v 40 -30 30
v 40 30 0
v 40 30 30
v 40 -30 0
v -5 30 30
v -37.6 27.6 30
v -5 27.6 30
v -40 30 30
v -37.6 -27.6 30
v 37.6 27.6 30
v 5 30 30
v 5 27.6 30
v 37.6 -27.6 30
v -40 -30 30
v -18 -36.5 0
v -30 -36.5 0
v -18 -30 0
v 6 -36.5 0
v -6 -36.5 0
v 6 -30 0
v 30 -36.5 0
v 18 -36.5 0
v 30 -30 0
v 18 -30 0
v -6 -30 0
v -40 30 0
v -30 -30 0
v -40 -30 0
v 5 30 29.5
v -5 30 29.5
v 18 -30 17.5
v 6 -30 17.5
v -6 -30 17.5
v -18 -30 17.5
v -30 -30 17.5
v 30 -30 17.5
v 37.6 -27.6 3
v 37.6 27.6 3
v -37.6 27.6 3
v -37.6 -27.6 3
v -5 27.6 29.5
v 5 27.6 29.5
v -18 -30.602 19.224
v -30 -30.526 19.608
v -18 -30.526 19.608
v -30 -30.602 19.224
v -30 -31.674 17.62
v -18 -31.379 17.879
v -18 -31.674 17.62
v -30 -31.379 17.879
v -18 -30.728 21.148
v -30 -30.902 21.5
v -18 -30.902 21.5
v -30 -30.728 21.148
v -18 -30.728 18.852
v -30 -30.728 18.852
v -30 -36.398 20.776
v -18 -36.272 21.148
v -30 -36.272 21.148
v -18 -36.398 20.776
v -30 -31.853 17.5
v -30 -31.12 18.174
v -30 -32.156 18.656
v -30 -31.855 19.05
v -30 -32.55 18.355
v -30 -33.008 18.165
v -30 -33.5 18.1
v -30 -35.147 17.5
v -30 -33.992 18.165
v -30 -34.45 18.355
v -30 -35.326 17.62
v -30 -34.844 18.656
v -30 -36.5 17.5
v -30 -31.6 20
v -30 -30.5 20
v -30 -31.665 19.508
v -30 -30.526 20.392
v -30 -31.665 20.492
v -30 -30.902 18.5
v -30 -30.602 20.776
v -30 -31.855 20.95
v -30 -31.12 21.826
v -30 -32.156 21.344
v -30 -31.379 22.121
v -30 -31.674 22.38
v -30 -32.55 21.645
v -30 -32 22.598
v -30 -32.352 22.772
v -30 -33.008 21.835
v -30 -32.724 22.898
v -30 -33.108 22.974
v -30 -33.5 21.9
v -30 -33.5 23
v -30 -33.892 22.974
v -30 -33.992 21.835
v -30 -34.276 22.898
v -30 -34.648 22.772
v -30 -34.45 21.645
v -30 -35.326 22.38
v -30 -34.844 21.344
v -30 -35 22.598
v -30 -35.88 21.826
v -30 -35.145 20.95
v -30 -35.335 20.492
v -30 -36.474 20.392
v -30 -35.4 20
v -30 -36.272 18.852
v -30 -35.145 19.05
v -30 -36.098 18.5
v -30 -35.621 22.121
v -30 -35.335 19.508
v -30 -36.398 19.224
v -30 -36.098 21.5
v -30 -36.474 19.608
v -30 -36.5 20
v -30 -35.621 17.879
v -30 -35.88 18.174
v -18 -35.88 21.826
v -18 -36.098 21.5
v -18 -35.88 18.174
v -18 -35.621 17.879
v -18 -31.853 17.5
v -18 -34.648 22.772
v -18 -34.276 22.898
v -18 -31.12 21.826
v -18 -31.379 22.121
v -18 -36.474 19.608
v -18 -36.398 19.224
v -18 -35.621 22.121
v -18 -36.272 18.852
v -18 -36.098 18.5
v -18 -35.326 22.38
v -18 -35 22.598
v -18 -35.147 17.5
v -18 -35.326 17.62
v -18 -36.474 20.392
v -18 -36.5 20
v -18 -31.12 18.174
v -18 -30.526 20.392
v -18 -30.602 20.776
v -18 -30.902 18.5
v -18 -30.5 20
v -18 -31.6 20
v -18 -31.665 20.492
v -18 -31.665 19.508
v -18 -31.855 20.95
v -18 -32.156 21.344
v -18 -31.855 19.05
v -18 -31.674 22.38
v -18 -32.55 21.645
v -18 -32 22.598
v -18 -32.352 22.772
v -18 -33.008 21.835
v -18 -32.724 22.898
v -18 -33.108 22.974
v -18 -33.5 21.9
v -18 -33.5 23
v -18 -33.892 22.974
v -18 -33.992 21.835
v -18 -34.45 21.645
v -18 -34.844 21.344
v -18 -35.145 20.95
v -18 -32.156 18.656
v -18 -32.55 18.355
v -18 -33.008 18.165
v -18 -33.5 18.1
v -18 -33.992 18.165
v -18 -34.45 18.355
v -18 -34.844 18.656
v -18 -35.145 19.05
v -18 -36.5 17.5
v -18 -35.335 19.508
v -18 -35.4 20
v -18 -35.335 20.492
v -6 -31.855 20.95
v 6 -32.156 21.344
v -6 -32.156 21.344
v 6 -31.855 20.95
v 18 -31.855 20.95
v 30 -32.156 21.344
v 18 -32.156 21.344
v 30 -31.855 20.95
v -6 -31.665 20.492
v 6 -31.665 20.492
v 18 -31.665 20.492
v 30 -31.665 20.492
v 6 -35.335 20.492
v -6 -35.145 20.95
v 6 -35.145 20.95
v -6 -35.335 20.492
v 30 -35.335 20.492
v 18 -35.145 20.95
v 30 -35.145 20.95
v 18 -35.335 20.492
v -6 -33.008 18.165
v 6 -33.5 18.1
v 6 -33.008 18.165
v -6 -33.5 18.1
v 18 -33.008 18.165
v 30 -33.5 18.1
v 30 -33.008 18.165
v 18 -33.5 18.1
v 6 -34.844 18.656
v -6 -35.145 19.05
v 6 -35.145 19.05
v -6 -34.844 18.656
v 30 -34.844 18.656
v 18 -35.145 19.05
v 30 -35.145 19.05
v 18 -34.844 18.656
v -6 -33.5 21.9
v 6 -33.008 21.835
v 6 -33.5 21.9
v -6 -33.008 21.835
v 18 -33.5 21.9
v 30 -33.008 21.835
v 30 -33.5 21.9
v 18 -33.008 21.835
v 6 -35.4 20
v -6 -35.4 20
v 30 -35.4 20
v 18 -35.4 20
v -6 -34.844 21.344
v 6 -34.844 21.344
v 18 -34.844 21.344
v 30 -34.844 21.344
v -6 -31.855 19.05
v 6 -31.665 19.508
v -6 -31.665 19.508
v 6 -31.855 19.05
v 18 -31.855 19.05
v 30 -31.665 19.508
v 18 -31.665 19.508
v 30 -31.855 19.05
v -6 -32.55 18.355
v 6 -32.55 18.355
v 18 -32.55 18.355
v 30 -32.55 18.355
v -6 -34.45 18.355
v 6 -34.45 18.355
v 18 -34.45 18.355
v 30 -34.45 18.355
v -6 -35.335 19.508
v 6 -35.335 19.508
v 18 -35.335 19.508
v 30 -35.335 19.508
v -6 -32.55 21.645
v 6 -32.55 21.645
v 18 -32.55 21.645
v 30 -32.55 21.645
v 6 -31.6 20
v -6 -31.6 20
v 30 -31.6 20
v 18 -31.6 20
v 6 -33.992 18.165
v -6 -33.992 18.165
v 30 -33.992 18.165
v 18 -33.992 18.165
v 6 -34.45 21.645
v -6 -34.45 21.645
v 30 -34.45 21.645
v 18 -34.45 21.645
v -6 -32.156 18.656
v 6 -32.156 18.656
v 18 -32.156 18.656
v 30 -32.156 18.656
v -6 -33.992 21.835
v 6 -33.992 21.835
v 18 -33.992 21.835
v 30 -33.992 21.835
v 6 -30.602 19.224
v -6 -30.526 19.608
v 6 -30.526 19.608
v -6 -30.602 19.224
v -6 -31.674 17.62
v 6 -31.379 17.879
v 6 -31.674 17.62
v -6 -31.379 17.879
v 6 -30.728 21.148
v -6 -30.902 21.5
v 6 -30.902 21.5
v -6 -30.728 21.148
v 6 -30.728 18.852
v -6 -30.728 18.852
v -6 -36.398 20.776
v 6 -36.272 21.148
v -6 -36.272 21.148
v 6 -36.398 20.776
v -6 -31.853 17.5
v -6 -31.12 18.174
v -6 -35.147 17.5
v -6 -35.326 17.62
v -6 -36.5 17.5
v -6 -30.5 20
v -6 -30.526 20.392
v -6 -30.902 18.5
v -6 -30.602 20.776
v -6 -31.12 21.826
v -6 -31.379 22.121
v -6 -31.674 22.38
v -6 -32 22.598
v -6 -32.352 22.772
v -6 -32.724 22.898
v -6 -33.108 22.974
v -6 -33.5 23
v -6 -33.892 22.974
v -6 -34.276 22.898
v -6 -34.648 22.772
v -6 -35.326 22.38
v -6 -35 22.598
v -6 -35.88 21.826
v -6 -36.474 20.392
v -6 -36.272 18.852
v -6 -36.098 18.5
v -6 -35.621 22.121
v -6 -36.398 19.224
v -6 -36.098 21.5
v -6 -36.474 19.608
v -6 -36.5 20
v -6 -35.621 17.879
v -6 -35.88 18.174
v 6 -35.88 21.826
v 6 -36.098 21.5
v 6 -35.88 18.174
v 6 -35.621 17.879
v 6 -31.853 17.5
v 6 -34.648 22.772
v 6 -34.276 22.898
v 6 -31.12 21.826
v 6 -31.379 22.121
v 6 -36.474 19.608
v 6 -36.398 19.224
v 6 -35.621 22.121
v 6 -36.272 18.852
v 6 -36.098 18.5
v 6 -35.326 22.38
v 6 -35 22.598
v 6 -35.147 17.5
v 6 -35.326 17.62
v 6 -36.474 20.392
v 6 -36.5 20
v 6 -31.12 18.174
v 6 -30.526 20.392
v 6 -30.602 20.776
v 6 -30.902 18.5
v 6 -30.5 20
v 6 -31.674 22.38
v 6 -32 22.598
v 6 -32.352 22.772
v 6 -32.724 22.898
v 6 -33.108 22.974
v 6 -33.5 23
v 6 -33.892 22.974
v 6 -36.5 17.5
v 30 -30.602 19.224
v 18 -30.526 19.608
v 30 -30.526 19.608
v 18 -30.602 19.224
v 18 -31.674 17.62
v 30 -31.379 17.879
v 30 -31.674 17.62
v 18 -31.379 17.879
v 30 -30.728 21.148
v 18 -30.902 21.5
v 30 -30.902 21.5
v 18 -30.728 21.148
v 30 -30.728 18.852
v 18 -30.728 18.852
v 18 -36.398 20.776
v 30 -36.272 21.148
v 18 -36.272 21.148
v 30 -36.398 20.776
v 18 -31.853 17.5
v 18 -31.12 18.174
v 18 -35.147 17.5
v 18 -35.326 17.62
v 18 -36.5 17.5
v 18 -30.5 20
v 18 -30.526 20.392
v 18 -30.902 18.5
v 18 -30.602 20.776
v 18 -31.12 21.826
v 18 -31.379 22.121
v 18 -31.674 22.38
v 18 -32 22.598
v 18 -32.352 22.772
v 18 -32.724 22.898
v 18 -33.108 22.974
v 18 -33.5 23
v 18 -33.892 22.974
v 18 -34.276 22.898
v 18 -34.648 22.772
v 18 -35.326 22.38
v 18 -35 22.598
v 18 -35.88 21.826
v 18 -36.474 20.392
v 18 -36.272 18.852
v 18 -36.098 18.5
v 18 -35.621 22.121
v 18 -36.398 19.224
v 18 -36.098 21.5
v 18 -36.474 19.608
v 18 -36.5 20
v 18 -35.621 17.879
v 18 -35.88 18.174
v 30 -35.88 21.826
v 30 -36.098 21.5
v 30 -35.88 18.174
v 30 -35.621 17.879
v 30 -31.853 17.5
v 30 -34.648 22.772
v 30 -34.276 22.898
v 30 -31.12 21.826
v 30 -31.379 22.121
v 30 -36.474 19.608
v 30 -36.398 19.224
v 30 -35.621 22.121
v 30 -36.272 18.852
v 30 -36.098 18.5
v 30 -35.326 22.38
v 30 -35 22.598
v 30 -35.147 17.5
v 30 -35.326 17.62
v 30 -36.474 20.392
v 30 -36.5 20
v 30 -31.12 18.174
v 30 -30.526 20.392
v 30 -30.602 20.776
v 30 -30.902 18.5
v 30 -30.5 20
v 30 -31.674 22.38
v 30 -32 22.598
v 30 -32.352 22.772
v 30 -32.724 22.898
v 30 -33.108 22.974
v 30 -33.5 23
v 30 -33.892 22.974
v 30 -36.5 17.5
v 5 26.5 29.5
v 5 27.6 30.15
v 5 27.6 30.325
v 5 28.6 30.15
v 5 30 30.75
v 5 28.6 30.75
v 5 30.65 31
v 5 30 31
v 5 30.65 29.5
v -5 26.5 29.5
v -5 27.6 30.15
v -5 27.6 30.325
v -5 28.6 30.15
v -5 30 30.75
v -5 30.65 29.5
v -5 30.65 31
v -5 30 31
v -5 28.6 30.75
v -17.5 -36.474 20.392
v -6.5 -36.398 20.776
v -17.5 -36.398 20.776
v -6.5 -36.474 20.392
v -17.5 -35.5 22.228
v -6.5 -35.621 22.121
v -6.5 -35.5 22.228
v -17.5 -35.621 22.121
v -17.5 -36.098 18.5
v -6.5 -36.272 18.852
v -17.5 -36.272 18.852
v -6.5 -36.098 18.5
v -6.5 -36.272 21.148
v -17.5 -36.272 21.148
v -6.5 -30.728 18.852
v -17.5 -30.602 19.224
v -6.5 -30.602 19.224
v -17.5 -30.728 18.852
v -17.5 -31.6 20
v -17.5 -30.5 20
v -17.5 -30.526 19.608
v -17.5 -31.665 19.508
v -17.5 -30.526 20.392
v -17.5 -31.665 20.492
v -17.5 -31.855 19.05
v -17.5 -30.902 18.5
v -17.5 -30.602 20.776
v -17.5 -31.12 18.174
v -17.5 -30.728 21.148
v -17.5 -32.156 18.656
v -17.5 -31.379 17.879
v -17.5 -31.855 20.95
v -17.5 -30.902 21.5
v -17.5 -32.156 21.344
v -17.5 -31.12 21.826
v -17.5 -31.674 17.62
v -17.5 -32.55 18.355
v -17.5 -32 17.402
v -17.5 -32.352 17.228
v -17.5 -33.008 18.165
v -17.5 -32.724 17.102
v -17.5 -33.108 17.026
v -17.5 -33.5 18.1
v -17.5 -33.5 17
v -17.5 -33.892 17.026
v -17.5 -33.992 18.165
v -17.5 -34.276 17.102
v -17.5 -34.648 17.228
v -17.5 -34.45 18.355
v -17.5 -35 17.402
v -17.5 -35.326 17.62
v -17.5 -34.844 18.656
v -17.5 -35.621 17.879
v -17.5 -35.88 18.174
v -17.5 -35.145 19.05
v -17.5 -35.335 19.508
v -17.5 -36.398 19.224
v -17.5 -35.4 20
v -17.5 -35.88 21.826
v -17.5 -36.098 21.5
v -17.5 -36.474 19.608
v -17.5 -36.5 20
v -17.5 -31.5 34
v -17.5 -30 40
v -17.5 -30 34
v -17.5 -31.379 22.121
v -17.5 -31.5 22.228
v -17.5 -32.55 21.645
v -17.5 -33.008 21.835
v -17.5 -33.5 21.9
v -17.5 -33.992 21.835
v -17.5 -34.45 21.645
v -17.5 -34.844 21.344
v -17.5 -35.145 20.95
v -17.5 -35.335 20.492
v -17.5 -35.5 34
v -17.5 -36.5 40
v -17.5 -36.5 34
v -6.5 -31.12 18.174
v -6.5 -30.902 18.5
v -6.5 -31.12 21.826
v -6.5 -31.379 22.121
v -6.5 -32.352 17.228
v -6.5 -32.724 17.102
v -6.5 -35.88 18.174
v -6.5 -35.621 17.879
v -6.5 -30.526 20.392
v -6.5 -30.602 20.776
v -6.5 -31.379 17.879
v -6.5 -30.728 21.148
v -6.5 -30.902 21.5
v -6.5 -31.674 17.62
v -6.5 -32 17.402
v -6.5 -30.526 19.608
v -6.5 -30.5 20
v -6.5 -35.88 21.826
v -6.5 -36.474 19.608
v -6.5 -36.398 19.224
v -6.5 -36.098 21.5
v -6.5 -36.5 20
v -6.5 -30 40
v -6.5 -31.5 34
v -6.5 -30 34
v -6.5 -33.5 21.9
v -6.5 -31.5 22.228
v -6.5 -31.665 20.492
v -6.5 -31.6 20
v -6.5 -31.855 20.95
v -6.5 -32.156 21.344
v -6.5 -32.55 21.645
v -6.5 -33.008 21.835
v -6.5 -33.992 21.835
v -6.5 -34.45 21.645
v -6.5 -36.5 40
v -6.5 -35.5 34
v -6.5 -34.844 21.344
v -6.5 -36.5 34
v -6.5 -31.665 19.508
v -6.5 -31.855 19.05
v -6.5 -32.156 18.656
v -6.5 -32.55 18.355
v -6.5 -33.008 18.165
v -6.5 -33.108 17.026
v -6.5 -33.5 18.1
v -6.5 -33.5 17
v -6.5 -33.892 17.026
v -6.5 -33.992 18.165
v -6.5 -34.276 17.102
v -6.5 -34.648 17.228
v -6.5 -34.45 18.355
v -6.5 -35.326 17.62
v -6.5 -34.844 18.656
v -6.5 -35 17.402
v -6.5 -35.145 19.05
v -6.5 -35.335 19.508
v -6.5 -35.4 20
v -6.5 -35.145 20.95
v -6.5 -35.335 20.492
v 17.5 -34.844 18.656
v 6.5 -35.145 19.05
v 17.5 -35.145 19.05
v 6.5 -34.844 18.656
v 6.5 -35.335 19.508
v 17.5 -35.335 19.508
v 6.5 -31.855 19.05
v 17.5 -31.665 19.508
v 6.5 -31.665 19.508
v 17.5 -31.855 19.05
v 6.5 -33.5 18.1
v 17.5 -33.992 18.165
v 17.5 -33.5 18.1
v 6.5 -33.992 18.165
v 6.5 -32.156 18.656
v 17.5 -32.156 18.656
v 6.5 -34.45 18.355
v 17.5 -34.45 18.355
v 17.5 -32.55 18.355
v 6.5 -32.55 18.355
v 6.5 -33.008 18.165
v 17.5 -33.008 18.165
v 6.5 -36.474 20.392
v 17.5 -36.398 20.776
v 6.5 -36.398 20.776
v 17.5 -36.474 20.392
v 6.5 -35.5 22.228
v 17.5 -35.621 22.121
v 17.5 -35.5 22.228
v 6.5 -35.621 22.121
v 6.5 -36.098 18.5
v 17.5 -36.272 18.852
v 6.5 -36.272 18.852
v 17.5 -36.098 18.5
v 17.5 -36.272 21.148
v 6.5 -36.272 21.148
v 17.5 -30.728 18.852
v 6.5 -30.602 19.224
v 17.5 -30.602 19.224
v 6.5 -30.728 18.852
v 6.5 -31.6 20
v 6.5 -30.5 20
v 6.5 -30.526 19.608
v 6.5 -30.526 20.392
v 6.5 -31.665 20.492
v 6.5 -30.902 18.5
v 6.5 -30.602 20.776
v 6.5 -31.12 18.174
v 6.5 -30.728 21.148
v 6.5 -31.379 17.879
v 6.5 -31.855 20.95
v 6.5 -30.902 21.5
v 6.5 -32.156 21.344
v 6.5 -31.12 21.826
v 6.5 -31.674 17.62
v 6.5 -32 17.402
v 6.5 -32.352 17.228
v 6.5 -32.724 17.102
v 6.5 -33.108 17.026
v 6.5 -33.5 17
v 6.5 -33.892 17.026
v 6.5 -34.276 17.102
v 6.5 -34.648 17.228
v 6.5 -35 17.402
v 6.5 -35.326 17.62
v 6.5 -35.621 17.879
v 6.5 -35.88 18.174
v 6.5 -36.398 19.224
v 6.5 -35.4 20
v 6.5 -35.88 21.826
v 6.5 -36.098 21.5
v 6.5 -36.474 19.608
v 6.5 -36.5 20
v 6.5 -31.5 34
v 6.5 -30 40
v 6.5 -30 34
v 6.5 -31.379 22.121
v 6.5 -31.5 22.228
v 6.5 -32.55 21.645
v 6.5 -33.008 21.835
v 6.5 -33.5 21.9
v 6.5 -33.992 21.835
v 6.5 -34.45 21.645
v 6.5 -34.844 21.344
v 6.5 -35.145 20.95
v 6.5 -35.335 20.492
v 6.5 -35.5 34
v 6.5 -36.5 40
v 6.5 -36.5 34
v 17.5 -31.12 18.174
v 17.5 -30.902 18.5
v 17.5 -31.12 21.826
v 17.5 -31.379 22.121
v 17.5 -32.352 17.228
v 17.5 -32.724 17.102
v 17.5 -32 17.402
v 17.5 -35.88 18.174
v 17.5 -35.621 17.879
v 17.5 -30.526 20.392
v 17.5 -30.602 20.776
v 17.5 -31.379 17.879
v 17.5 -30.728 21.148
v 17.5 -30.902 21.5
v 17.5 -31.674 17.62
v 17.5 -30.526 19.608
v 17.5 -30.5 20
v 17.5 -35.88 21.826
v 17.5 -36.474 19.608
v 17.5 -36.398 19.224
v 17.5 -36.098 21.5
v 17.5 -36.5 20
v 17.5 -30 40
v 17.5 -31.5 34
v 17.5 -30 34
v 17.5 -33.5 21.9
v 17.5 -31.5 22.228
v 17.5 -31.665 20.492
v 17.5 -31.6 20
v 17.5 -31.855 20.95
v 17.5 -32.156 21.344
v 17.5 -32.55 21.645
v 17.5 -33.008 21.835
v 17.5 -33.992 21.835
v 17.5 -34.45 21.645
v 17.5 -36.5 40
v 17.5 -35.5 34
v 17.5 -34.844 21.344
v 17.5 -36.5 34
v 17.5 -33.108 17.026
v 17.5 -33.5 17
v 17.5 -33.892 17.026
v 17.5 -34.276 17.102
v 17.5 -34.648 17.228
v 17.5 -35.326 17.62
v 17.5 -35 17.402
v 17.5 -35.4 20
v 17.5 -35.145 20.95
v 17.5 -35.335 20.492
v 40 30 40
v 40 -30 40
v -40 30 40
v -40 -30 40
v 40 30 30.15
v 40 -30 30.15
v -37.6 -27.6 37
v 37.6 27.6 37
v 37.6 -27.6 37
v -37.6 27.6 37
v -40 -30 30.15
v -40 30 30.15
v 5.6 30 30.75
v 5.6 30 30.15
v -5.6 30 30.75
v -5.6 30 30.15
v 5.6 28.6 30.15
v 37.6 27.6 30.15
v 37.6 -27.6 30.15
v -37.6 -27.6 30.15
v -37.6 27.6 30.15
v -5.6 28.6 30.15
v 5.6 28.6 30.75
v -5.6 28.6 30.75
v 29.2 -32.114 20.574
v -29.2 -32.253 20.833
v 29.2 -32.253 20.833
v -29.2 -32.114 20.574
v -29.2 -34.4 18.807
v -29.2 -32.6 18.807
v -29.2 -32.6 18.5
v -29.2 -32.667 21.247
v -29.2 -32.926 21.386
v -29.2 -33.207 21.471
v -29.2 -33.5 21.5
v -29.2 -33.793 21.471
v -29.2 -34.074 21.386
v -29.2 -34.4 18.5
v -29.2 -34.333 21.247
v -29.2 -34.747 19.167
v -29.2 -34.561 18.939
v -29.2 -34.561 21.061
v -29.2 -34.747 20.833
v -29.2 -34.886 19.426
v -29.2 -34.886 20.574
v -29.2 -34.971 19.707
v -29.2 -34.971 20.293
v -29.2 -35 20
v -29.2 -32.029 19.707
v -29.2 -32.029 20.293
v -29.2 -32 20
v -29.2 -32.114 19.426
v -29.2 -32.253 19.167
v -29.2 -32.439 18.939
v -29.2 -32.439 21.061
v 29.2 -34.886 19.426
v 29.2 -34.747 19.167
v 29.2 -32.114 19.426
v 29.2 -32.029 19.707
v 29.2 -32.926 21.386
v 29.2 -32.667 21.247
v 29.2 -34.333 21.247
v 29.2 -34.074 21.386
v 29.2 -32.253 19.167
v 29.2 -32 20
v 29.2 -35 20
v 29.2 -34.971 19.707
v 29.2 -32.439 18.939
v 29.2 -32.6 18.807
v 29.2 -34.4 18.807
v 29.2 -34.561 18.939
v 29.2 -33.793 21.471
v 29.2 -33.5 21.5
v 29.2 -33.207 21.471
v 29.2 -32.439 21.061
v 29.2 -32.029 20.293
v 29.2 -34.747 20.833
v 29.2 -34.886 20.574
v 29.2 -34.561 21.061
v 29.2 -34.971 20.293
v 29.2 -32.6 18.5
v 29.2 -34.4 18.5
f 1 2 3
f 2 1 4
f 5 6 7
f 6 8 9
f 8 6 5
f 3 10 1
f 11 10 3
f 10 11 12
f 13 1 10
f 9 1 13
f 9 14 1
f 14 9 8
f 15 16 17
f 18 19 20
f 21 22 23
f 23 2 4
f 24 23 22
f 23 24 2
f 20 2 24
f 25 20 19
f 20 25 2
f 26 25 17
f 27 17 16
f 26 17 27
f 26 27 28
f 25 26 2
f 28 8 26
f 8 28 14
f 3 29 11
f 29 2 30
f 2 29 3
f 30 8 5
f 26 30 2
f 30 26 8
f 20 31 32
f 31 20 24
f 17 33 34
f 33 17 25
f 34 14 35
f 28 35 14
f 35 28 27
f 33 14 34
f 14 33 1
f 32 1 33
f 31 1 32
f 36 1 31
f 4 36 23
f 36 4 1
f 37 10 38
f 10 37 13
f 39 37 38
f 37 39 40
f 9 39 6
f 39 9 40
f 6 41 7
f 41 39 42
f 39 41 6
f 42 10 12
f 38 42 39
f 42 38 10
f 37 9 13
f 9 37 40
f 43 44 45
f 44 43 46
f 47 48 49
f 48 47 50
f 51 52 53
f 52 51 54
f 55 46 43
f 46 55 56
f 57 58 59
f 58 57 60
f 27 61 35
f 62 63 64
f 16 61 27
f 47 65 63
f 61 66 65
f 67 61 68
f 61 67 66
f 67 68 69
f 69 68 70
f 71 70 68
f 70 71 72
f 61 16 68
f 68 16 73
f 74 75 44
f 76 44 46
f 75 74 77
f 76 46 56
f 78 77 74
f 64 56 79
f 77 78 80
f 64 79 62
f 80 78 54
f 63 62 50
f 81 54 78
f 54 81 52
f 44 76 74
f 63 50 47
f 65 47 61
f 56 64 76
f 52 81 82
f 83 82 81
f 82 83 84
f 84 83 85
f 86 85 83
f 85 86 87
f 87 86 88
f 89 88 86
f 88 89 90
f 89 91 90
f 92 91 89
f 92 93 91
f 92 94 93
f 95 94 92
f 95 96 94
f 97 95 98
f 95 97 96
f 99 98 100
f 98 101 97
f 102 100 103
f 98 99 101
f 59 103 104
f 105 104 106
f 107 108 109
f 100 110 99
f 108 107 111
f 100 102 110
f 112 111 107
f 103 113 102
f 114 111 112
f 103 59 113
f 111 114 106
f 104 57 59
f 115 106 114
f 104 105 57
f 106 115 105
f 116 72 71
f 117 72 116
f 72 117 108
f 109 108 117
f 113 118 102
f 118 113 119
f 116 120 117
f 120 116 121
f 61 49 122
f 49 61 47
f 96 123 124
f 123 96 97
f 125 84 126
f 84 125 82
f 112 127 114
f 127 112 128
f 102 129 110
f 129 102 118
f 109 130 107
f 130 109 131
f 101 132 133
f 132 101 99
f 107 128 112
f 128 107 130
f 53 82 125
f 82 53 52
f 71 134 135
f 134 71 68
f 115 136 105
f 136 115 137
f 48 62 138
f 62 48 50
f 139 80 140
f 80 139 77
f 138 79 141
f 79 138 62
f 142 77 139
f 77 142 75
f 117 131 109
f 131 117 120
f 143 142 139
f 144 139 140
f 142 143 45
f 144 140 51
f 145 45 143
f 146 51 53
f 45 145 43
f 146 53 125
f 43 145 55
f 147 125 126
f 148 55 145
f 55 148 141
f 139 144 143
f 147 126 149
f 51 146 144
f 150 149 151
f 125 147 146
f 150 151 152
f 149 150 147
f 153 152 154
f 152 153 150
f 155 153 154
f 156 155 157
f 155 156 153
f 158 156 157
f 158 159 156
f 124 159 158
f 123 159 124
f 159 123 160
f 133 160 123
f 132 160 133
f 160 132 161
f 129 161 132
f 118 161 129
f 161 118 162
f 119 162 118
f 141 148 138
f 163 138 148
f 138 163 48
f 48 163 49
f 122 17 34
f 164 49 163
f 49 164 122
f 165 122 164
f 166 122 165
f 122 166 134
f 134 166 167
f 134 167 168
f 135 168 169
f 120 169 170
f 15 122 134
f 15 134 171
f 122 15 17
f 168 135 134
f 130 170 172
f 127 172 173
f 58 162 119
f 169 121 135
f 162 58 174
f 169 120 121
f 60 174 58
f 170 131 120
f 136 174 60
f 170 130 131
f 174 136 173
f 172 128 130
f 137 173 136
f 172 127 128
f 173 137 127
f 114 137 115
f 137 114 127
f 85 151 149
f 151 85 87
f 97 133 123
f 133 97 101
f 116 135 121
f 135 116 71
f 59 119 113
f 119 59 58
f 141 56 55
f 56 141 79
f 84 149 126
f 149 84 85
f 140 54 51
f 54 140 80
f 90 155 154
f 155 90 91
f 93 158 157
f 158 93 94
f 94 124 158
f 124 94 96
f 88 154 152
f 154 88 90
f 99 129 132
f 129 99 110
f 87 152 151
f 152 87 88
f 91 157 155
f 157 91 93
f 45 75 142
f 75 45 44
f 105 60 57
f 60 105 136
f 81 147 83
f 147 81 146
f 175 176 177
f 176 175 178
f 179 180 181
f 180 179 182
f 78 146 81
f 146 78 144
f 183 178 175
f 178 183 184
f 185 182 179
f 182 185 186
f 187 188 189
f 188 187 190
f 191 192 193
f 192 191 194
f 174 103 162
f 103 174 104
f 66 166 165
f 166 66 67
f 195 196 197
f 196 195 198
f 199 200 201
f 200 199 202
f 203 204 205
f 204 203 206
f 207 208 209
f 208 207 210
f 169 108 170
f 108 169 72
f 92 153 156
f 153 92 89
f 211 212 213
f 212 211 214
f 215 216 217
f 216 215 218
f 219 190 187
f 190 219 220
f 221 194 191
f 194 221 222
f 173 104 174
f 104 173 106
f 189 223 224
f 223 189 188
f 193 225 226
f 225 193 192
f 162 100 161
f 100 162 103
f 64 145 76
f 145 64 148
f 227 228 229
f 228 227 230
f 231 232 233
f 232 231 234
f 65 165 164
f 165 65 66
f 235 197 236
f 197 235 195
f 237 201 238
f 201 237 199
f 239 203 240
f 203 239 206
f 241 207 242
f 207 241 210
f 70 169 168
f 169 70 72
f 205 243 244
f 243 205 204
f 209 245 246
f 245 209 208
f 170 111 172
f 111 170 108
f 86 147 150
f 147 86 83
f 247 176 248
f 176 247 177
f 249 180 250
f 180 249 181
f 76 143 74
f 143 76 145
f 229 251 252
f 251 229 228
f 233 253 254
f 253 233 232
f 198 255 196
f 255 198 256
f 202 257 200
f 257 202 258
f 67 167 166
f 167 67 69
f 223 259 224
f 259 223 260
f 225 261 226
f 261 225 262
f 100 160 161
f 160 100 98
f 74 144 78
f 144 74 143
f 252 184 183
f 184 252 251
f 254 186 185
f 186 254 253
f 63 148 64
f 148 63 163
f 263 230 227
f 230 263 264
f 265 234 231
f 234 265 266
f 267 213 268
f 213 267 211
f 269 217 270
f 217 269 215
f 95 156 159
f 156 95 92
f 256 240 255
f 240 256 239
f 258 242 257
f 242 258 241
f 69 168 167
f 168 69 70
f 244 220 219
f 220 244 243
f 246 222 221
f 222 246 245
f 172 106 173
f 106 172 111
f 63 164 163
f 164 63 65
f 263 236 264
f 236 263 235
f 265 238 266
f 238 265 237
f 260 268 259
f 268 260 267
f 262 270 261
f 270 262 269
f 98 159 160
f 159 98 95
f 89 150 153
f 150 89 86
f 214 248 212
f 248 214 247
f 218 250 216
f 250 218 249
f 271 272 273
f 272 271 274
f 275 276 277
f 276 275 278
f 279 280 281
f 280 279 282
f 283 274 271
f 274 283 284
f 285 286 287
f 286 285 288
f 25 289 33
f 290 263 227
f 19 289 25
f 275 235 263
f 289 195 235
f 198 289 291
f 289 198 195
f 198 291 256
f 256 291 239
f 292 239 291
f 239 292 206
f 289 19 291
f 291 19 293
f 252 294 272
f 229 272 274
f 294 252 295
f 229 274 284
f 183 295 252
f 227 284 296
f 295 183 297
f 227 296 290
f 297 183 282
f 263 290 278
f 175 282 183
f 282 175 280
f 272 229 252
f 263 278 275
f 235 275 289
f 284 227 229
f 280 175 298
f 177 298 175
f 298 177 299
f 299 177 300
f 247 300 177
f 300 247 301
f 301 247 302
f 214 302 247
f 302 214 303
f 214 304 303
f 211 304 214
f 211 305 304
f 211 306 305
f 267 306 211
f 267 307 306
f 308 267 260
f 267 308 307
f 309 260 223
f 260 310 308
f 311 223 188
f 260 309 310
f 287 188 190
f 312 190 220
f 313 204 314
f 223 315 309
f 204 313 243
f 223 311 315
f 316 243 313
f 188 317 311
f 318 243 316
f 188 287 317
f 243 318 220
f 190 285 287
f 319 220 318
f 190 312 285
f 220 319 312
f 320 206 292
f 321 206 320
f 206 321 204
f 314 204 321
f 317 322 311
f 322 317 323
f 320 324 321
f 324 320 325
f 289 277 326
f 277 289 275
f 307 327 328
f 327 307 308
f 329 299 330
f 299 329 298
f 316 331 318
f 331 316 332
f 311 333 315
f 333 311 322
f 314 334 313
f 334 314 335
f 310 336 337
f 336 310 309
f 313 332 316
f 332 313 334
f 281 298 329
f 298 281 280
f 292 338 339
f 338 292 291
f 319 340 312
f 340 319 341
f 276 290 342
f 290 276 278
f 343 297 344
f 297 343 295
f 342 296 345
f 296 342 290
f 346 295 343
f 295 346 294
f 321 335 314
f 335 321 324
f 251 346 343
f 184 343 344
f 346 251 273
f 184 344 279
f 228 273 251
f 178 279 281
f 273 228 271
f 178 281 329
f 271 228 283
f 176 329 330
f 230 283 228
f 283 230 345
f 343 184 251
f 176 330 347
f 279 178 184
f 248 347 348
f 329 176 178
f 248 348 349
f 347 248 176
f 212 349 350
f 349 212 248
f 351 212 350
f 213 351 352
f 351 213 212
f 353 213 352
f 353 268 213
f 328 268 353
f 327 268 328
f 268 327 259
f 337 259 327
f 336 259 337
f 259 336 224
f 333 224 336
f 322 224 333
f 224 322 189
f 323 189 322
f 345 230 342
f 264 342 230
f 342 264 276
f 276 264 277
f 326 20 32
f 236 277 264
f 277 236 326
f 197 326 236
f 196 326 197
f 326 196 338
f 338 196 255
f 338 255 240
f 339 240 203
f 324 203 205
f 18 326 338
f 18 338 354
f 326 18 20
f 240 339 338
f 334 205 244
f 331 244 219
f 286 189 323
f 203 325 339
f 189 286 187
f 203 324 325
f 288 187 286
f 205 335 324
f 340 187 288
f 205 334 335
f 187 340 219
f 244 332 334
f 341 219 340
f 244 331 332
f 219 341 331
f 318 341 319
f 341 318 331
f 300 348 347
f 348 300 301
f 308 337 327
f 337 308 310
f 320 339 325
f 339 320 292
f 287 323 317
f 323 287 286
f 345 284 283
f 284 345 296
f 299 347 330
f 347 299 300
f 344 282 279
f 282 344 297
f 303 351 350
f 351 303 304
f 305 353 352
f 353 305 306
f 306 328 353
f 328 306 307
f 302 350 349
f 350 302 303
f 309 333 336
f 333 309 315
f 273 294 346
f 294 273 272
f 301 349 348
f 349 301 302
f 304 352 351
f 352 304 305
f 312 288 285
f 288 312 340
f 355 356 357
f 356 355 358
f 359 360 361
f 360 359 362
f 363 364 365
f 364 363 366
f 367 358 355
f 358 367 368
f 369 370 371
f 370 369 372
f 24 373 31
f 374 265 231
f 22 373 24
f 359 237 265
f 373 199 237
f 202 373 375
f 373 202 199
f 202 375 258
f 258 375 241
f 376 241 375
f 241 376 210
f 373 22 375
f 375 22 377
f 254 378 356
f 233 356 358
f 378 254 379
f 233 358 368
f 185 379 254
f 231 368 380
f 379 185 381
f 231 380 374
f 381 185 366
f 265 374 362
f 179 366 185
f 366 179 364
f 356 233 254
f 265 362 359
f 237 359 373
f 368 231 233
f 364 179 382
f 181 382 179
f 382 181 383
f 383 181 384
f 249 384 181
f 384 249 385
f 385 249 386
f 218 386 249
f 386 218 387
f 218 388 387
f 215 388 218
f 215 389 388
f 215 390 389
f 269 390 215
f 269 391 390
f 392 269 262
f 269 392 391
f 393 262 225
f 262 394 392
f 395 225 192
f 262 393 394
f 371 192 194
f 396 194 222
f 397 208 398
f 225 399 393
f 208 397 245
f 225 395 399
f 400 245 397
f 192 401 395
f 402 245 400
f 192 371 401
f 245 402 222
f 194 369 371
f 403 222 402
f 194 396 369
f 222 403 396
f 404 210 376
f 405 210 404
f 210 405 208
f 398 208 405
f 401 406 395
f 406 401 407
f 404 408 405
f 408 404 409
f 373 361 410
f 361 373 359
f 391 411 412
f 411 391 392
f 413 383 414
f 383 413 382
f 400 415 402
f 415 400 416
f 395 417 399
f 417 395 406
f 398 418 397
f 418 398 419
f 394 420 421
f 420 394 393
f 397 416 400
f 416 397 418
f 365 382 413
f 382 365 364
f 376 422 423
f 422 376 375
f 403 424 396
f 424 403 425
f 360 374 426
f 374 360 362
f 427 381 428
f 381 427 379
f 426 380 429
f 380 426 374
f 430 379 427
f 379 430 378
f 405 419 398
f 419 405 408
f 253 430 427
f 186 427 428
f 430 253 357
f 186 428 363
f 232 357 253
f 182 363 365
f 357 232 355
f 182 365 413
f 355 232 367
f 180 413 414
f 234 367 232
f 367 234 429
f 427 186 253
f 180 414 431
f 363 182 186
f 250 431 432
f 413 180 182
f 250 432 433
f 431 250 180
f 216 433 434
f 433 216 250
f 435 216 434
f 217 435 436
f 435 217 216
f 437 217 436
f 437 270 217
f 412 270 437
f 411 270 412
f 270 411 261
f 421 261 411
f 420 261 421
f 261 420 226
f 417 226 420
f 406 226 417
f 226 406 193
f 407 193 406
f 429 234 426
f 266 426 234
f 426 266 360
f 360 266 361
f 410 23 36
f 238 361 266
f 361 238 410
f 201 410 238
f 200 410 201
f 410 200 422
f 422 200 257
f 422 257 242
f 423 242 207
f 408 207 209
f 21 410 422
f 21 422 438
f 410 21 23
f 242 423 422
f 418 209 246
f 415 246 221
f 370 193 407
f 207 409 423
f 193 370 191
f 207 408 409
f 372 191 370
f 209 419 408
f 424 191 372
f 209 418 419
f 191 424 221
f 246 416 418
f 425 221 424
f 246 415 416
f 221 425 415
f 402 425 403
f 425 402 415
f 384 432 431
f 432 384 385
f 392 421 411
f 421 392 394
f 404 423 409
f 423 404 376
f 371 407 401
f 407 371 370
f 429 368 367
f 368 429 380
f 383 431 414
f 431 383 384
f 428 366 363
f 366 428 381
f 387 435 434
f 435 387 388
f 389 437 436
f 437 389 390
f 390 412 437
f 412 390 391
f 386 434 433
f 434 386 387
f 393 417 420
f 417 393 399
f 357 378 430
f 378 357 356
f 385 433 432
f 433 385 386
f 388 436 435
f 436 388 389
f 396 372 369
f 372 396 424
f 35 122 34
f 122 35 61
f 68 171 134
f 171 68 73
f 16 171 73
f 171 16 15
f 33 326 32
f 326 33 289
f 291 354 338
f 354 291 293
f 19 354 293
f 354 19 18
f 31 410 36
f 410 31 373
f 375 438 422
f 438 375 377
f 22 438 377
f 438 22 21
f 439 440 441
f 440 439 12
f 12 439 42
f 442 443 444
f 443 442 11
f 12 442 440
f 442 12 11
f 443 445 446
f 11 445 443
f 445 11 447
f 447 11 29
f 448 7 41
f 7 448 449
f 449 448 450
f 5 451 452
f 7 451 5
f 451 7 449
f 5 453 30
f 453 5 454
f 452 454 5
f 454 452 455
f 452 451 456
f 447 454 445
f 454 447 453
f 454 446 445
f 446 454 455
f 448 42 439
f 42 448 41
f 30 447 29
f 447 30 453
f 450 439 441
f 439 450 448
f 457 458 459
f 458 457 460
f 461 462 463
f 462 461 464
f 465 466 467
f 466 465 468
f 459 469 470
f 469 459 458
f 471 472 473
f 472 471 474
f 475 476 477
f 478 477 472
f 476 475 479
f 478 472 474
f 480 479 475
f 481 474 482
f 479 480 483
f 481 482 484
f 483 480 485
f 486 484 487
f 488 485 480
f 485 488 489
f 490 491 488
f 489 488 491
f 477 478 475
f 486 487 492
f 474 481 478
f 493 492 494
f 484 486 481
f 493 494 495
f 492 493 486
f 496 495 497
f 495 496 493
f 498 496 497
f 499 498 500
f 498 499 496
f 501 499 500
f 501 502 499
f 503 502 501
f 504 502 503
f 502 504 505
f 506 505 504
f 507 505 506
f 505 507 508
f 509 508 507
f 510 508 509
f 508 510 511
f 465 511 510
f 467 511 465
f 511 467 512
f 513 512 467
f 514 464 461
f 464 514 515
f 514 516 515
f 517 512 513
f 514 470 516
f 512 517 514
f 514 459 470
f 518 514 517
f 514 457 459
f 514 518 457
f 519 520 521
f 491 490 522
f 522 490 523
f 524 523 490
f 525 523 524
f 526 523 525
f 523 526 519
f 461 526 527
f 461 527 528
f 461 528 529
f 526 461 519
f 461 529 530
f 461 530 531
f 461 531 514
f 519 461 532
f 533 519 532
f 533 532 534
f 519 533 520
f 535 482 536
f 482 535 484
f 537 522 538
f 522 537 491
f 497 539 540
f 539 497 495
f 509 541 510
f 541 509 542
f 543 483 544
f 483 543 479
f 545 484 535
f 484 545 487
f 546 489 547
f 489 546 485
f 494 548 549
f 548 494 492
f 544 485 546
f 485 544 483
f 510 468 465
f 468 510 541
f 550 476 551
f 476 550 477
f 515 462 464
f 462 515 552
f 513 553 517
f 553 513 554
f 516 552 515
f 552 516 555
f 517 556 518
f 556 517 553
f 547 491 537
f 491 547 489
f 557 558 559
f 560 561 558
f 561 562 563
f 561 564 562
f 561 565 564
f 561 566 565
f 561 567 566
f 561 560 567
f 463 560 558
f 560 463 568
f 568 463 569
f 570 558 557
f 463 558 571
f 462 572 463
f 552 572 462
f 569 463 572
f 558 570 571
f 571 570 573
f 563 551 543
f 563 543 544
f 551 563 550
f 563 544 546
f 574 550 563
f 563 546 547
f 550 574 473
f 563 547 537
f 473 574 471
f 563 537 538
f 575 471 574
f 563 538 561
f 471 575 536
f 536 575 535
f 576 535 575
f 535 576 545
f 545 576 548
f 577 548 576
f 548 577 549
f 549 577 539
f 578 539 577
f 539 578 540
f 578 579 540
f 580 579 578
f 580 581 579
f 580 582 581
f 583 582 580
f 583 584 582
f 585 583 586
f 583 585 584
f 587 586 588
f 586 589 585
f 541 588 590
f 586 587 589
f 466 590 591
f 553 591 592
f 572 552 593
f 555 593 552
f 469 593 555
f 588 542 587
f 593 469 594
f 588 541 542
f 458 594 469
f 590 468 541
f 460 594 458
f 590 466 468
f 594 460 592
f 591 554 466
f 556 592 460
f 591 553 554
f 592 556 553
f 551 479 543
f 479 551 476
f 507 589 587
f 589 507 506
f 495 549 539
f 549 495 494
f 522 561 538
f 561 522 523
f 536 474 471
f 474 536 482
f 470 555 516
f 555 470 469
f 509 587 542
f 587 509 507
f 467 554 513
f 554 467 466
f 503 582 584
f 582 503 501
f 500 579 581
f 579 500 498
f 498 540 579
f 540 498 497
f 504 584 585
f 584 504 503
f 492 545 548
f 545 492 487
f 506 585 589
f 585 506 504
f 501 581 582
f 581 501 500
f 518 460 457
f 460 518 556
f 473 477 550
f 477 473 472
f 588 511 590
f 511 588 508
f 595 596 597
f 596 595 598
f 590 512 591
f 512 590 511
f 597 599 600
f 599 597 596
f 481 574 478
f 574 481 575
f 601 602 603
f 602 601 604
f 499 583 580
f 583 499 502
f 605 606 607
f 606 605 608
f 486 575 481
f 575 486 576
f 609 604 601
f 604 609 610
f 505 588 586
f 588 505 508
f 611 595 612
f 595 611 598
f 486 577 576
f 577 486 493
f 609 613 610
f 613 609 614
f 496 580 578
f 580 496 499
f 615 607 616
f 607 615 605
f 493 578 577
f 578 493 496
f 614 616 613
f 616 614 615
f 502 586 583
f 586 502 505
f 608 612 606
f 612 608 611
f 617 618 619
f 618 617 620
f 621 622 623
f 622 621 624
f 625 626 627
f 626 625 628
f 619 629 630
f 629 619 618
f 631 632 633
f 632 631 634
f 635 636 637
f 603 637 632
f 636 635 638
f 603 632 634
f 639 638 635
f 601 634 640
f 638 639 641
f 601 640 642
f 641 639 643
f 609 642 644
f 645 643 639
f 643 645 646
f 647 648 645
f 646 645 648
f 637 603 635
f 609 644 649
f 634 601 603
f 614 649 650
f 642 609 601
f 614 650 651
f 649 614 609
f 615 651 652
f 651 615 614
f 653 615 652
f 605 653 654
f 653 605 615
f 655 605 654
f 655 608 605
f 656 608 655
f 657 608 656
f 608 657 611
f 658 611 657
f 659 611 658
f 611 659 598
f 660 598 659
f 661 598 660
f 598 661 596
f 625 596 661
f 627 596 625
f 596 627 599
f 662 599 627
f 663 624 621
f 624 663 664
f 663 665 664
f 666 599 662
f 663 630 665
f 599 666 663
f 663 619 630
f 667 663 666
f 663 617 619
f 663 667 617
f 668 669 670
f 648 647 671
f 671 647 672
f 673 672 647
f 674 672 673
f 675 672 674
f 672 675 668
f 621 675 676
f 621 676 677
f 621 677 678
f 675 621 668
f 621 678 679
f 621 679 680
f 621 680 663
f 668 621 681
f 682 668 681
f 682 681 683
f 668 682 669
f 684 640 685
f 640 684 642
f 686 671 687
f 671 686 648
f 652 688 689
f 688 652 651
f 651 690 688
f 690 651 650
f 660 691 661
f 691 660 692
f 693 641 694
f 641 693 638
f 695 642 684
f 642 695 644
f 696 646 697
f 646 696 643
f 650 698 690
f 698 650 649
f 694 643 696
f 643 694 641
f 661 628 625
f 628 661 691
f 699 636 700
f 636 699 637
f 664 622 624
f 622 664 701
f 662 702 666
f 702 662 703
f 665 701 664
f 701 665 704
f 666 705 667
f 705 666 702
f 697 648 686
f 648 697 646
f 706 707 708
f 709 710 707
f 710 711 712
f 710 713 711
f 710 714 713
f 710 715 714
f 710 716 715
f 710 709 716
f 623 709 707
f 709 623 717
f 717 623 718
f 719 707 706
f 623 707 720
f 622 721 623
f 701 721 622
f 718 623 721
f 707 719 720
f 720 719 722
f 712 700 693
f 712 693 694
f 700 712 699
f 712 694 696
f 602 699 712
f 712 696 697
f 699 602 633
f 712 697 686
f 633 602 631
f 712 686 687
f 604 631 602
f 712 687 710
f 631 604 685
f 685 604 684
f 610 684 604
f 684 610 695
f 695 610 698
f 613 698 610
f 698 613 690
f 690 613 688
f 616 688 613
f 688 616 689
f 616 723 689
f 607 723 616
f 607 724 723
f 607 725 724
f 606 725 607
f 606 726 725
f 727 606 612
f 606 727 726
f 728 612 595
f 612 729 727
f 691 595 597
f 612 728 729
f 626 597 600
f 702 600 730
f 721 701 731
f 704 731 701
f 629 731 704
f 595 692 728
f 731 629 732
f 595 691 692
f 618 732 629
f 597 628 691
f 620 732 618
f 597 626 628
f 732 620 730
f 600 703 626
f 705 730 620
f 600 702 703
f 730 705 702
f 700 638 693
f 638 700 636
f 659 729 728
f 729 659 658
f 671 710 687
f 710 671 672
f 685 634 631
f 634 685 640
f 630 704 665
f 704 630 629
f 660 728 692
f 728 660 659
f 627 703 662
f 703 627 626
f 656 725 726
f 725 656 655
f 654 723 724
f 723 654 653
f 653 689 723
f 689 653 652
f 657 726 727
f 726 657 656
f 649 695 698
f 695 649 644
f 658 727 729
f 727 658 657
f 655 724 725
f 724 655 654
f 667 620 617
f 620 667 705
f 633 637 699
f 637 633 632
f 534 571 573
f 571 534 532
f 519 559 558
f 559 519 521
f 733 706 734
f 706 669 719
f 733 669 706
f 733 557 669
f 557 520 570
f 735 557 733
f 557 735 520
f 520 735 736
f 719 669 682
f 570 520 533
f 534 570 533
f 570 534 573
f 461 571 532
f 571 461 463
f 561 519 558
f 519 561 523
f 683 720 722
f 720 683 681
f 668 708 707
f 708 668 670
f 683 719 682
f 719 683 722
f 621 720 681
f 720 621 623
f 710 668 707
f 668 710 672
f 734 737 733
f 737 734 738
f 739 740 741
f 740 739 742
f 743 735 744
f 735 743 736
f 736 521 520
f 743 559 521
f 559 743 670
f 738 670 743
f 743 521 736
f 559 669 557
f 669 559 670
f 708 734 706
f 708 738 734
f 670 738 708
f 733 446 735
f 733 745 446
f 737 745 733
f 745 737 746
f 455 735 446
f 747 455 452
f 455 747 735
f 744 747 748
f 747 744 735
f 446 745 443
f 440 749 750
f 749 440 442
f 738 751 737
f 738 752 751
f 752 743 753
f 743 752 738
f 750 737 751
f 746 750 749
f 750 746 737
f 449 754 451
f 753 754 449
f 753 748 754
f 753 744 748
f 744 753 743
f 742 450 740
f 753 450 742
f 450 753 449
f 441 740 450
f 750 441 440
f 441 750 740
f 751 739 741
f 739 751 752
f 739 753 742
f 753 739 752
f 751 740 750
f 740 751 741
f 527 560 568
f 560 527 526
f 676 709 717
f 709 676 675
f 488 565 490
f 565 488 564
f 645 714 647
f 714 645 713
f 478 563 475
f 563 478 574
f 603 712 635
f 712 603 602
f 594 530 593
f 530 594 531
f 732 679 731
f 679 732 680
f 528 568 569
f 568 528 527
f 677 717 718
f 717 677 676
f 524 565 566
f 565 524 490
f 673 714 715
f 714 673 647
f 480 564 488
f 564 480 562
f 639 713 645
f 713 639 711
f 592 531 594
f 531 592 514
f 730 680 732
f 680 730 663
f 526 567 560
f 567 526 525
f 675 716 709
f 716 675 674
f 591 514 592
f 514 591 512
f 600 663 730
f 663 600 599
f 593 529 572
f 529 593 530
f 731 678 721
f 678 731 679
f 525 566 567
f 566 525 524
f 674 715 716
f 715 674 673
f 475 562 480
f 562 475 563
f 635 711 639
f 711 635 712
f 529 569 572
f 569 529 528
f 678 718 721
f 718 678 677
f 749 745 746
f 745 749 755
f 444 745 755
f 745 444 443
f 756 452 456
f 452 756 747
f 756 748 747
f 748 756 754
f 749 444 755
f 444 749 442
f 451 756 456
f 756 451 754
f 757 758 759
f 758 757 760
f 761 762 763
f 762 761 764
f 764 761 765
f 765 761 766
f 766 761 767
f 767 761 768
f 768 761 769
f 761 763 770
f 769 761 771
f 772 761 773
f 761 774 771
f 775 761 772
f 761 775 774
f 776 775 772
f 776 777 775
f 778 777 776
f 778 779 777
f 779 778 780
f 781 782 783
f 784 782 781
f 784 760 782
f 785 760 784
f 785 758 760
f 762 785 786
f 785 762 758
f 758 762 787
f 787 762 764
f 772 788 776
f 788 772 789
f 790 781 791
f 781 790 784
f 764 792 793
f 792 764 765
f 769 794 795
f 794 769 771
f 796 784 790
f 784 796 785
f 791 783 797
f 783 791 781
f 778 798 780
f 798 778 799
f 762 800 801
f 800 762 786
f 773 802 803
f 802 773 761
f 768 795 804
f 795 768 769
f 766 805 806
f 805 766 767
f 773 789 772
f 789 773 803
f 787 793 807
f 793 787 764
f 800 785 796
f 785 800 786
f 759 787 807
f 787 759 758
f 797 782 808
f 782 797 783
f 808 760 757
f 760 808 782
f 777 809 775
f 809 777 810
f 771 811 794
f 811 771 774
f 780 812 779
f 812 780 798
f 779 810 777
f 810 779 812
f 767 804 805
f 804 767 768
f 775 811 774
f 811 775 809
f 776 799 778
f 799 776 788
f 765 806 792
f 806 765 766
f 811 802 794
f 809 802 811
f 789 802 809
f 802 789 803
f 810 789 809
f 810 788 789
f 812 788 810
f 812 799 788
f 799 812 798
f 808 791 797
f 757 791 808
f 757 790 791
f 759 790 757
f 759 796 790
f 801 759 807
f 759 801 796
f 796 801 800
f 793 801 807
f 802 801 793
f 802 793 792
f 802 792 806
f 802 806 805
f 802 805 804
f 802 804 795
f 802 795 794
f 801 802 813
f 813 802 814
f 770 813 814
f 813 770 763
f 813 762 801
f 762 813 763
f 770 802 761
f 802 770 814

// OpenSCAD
part = "assembly"; // [base, lid, pin, assembly]
cadverify_only = "";
module instance(name, part, unit = 1) {
  echo(cadverify_instance = [name, part, unit]);
  if (cadverify_only == "" || cadverify_only == name) children();
}
Ya = -33.5; Za = 20; Kr = 3.0; Br = 1.9; Pr = 1.5;
BX = [[-30,-18],[-6,6],[18,30]];
LX = [[-17.5,-6.5],[6.5,17.5]];
module barrelX(x0, x1) {
  difference() {
    translate([0,Ya,Za]) rotate([0,90,0]) translate([0,0,(x0+x1)/2])
      cylinder(h=x1-x0, r=Kr, center=true, $fn=48);
    translate([0,Ya,Za]) rotate([0,90,0]) translate([0,0,(x0+x1)/2])
      cylinder(h=(x1-x0)+1.0, r=Br, center=true, $fn=24);
  }
}
module base_geom() {
  difference() {
  union() {
    difference() {
      translate([-40,-30,0]) cube([80,60,30]);
      translate([-37.6,-27.6,3]) cube([75.2,55.2,27.01]);
    }
    for (b=BX) {
      translate([b[0],-36.5,0]) cube([b[1]-b[0],6.5,17.5]);
      barrelX(b[0], b[1]);
    }
    translate([5,0,0]) rotate([0,-90,0]) linear_extrude(height=10)
      polygon([[29.5,26.5],[31,28.5],[31,30.65],[29.5,30.65]]);
  }
  translate([0,Ya,Za]) rotate([0,90,0]) translate([0,0,0])
    cylinder(h=62, r=Br, center=true, $fn=24);
  }
}
module lid_open() {
  difference() {
    union() {
      translate([-40,-97,0]) cube([80,60,3]);
      translate([-40,-97,3]) cube([80,2.4,6.85]);
      translate([-40,-39.4,3]) cube([80,2.4,6.85]);
      translate([-40,-97,3]) cube([2.4,60,6.85]);
      translate([37.6,-97,3]) cube([2.4,60,6.85]);
      for (b=LX) {
        translate([b[0],-39,0]) cube([b[1]-b[0],8.5,6]);
        translate([b[0],-35.5,3]) cube([b[1]-b[0],4,17.5]);
        barrelX(b[0], b[1]);
      }
    }
    translate([0,Ya,Za]) rotate([0,90,0]) translate([0,0,0])
      cylinder(h=62, r=Br, center=true, $fn=24);
    translate([-5.6,-98.6,9.25]) cube([11.2,3,0.76]);
  }
}
module pin_geom() {
  union() {
    translate([-29.2,0,1.5]) rotate([0,90,0])
      cylinder(h=58.4, r=Pr, center=false, $fn=32);
    translate([-29.2,-0.9,0]) cube([58.4,1.8,0.6]);
  }
}
module lid_closed() {
  translate([0,Ya,Za]) rotate([180,0,0]) translate([0,-Ya,-Za]) lid_open();
}
module pin_placed() {
  translate([0,Ya,Za-1.5]) pin_geom();
}
if (part=="base") {
  base_geom();
  echo(cadverify_spec=[
    ["bounds", [[-40,-36.5,0],[40,30.65,31]]],
    ["bodies", 1],
    ["support_faces", [["base","-z",4000]]],
    ["overhangs_allowed", [["hinge", [[-30,-37,16],[30,-30,24]]]]],
    ["copies", 1],
    ["details", [
      ["bottom","thickness",[0,0,-1],[0,0,1],3],
      ["cavity","void",[[-37.6,-27.6,3],[37.6,27.6,30]],0.9],
      ["knuckle","material",[[-30,-36.5,17],[-18,-30.5,23]],0.5],
      ["bore","hole",[-31,-33.5,20],[1,0,0],[[0,3.8],[10,3.8]]],
      ["catch","material",[[-5,30,26.5],[5,31,30.65]],0.15]
    ]]
  ]);
} else if (part=="lid") {
  lid_open();
  echo(cadverify_spec=[
    ["bounds", [[-40,-97,0],[40,-30.5,23]]],
    ["bodies", 1],
    ["support_faces", [["lid","-z",4000]]],
    ["overhangs_allowed", [["hinge", [[-30,-37,16],[30,-30,24]]]]],
    ["copies", 1],
    ["details", [
      ["plate","thickness",[0,-67,-1],[0,0,1],3],
      ["pocket","void",[[-37.6,-94.6,3],[37.6,-39.4,9.85]],0.9],
      ["knuckle","material",[[-17.5,-36.5,17],[-6.5,-30.5,23]],0.6],
      ["bore","hole",[-18,-33.5,20],[1,0,0],[[0,3.8],[9,3.8]]],
      ["notch","void",[[-5.6,-97,9.25],[5.6,-95.6,9.85]],0.9]
    ]]
  ]);
} else if (part=="pin") {
  pin_geom();
  echo(cadverify_spec=[
    ["bounds", [[-29.2,-1.5,0],[29.2,1.5,3]]],
    ["bodies", 1],
    ["support_faces", [["pin","-z",50]]],
    ["overhangs_allowed", [["flanks", [[-29.2,-1.5,0],[29.2,1.5,3]]]]],
    ["copies", 1],
    ["details", [
      ["shaft","thickness",[0,5,1.5],[0,-1,0],3]
    ]]
  ]);
} else {
  instance("base","base") base_geom();
  instance("lid","lid") lid_closed();
  instance("pin","pin") pin_placed();
  echo(cadverify_spec=[
    ["bounds", [[-40,-36.5,0],[40,30.65,40]]],
    ["support_faces", [["bed","-z",4000]]],
    ["motions", [["swing",["lid"],"rotate",[0,-33.5,20],[1,0,0],[0,180],["flex",[["lid","base",0.5,"catch entry"]]]]]],
    ["assembly_order", [[["base"],[0,0,0]],[["lid"],[0,0,1]],[["pin"],[-1,0,0]]]],
    ["print_in_place", 0.4],
    ["print_pose", [["swing",180]]],
    ["overhangs_allowed", [["hinge", [[-30,-37,16],[30,-30,24]]]]]
  ]);
}
